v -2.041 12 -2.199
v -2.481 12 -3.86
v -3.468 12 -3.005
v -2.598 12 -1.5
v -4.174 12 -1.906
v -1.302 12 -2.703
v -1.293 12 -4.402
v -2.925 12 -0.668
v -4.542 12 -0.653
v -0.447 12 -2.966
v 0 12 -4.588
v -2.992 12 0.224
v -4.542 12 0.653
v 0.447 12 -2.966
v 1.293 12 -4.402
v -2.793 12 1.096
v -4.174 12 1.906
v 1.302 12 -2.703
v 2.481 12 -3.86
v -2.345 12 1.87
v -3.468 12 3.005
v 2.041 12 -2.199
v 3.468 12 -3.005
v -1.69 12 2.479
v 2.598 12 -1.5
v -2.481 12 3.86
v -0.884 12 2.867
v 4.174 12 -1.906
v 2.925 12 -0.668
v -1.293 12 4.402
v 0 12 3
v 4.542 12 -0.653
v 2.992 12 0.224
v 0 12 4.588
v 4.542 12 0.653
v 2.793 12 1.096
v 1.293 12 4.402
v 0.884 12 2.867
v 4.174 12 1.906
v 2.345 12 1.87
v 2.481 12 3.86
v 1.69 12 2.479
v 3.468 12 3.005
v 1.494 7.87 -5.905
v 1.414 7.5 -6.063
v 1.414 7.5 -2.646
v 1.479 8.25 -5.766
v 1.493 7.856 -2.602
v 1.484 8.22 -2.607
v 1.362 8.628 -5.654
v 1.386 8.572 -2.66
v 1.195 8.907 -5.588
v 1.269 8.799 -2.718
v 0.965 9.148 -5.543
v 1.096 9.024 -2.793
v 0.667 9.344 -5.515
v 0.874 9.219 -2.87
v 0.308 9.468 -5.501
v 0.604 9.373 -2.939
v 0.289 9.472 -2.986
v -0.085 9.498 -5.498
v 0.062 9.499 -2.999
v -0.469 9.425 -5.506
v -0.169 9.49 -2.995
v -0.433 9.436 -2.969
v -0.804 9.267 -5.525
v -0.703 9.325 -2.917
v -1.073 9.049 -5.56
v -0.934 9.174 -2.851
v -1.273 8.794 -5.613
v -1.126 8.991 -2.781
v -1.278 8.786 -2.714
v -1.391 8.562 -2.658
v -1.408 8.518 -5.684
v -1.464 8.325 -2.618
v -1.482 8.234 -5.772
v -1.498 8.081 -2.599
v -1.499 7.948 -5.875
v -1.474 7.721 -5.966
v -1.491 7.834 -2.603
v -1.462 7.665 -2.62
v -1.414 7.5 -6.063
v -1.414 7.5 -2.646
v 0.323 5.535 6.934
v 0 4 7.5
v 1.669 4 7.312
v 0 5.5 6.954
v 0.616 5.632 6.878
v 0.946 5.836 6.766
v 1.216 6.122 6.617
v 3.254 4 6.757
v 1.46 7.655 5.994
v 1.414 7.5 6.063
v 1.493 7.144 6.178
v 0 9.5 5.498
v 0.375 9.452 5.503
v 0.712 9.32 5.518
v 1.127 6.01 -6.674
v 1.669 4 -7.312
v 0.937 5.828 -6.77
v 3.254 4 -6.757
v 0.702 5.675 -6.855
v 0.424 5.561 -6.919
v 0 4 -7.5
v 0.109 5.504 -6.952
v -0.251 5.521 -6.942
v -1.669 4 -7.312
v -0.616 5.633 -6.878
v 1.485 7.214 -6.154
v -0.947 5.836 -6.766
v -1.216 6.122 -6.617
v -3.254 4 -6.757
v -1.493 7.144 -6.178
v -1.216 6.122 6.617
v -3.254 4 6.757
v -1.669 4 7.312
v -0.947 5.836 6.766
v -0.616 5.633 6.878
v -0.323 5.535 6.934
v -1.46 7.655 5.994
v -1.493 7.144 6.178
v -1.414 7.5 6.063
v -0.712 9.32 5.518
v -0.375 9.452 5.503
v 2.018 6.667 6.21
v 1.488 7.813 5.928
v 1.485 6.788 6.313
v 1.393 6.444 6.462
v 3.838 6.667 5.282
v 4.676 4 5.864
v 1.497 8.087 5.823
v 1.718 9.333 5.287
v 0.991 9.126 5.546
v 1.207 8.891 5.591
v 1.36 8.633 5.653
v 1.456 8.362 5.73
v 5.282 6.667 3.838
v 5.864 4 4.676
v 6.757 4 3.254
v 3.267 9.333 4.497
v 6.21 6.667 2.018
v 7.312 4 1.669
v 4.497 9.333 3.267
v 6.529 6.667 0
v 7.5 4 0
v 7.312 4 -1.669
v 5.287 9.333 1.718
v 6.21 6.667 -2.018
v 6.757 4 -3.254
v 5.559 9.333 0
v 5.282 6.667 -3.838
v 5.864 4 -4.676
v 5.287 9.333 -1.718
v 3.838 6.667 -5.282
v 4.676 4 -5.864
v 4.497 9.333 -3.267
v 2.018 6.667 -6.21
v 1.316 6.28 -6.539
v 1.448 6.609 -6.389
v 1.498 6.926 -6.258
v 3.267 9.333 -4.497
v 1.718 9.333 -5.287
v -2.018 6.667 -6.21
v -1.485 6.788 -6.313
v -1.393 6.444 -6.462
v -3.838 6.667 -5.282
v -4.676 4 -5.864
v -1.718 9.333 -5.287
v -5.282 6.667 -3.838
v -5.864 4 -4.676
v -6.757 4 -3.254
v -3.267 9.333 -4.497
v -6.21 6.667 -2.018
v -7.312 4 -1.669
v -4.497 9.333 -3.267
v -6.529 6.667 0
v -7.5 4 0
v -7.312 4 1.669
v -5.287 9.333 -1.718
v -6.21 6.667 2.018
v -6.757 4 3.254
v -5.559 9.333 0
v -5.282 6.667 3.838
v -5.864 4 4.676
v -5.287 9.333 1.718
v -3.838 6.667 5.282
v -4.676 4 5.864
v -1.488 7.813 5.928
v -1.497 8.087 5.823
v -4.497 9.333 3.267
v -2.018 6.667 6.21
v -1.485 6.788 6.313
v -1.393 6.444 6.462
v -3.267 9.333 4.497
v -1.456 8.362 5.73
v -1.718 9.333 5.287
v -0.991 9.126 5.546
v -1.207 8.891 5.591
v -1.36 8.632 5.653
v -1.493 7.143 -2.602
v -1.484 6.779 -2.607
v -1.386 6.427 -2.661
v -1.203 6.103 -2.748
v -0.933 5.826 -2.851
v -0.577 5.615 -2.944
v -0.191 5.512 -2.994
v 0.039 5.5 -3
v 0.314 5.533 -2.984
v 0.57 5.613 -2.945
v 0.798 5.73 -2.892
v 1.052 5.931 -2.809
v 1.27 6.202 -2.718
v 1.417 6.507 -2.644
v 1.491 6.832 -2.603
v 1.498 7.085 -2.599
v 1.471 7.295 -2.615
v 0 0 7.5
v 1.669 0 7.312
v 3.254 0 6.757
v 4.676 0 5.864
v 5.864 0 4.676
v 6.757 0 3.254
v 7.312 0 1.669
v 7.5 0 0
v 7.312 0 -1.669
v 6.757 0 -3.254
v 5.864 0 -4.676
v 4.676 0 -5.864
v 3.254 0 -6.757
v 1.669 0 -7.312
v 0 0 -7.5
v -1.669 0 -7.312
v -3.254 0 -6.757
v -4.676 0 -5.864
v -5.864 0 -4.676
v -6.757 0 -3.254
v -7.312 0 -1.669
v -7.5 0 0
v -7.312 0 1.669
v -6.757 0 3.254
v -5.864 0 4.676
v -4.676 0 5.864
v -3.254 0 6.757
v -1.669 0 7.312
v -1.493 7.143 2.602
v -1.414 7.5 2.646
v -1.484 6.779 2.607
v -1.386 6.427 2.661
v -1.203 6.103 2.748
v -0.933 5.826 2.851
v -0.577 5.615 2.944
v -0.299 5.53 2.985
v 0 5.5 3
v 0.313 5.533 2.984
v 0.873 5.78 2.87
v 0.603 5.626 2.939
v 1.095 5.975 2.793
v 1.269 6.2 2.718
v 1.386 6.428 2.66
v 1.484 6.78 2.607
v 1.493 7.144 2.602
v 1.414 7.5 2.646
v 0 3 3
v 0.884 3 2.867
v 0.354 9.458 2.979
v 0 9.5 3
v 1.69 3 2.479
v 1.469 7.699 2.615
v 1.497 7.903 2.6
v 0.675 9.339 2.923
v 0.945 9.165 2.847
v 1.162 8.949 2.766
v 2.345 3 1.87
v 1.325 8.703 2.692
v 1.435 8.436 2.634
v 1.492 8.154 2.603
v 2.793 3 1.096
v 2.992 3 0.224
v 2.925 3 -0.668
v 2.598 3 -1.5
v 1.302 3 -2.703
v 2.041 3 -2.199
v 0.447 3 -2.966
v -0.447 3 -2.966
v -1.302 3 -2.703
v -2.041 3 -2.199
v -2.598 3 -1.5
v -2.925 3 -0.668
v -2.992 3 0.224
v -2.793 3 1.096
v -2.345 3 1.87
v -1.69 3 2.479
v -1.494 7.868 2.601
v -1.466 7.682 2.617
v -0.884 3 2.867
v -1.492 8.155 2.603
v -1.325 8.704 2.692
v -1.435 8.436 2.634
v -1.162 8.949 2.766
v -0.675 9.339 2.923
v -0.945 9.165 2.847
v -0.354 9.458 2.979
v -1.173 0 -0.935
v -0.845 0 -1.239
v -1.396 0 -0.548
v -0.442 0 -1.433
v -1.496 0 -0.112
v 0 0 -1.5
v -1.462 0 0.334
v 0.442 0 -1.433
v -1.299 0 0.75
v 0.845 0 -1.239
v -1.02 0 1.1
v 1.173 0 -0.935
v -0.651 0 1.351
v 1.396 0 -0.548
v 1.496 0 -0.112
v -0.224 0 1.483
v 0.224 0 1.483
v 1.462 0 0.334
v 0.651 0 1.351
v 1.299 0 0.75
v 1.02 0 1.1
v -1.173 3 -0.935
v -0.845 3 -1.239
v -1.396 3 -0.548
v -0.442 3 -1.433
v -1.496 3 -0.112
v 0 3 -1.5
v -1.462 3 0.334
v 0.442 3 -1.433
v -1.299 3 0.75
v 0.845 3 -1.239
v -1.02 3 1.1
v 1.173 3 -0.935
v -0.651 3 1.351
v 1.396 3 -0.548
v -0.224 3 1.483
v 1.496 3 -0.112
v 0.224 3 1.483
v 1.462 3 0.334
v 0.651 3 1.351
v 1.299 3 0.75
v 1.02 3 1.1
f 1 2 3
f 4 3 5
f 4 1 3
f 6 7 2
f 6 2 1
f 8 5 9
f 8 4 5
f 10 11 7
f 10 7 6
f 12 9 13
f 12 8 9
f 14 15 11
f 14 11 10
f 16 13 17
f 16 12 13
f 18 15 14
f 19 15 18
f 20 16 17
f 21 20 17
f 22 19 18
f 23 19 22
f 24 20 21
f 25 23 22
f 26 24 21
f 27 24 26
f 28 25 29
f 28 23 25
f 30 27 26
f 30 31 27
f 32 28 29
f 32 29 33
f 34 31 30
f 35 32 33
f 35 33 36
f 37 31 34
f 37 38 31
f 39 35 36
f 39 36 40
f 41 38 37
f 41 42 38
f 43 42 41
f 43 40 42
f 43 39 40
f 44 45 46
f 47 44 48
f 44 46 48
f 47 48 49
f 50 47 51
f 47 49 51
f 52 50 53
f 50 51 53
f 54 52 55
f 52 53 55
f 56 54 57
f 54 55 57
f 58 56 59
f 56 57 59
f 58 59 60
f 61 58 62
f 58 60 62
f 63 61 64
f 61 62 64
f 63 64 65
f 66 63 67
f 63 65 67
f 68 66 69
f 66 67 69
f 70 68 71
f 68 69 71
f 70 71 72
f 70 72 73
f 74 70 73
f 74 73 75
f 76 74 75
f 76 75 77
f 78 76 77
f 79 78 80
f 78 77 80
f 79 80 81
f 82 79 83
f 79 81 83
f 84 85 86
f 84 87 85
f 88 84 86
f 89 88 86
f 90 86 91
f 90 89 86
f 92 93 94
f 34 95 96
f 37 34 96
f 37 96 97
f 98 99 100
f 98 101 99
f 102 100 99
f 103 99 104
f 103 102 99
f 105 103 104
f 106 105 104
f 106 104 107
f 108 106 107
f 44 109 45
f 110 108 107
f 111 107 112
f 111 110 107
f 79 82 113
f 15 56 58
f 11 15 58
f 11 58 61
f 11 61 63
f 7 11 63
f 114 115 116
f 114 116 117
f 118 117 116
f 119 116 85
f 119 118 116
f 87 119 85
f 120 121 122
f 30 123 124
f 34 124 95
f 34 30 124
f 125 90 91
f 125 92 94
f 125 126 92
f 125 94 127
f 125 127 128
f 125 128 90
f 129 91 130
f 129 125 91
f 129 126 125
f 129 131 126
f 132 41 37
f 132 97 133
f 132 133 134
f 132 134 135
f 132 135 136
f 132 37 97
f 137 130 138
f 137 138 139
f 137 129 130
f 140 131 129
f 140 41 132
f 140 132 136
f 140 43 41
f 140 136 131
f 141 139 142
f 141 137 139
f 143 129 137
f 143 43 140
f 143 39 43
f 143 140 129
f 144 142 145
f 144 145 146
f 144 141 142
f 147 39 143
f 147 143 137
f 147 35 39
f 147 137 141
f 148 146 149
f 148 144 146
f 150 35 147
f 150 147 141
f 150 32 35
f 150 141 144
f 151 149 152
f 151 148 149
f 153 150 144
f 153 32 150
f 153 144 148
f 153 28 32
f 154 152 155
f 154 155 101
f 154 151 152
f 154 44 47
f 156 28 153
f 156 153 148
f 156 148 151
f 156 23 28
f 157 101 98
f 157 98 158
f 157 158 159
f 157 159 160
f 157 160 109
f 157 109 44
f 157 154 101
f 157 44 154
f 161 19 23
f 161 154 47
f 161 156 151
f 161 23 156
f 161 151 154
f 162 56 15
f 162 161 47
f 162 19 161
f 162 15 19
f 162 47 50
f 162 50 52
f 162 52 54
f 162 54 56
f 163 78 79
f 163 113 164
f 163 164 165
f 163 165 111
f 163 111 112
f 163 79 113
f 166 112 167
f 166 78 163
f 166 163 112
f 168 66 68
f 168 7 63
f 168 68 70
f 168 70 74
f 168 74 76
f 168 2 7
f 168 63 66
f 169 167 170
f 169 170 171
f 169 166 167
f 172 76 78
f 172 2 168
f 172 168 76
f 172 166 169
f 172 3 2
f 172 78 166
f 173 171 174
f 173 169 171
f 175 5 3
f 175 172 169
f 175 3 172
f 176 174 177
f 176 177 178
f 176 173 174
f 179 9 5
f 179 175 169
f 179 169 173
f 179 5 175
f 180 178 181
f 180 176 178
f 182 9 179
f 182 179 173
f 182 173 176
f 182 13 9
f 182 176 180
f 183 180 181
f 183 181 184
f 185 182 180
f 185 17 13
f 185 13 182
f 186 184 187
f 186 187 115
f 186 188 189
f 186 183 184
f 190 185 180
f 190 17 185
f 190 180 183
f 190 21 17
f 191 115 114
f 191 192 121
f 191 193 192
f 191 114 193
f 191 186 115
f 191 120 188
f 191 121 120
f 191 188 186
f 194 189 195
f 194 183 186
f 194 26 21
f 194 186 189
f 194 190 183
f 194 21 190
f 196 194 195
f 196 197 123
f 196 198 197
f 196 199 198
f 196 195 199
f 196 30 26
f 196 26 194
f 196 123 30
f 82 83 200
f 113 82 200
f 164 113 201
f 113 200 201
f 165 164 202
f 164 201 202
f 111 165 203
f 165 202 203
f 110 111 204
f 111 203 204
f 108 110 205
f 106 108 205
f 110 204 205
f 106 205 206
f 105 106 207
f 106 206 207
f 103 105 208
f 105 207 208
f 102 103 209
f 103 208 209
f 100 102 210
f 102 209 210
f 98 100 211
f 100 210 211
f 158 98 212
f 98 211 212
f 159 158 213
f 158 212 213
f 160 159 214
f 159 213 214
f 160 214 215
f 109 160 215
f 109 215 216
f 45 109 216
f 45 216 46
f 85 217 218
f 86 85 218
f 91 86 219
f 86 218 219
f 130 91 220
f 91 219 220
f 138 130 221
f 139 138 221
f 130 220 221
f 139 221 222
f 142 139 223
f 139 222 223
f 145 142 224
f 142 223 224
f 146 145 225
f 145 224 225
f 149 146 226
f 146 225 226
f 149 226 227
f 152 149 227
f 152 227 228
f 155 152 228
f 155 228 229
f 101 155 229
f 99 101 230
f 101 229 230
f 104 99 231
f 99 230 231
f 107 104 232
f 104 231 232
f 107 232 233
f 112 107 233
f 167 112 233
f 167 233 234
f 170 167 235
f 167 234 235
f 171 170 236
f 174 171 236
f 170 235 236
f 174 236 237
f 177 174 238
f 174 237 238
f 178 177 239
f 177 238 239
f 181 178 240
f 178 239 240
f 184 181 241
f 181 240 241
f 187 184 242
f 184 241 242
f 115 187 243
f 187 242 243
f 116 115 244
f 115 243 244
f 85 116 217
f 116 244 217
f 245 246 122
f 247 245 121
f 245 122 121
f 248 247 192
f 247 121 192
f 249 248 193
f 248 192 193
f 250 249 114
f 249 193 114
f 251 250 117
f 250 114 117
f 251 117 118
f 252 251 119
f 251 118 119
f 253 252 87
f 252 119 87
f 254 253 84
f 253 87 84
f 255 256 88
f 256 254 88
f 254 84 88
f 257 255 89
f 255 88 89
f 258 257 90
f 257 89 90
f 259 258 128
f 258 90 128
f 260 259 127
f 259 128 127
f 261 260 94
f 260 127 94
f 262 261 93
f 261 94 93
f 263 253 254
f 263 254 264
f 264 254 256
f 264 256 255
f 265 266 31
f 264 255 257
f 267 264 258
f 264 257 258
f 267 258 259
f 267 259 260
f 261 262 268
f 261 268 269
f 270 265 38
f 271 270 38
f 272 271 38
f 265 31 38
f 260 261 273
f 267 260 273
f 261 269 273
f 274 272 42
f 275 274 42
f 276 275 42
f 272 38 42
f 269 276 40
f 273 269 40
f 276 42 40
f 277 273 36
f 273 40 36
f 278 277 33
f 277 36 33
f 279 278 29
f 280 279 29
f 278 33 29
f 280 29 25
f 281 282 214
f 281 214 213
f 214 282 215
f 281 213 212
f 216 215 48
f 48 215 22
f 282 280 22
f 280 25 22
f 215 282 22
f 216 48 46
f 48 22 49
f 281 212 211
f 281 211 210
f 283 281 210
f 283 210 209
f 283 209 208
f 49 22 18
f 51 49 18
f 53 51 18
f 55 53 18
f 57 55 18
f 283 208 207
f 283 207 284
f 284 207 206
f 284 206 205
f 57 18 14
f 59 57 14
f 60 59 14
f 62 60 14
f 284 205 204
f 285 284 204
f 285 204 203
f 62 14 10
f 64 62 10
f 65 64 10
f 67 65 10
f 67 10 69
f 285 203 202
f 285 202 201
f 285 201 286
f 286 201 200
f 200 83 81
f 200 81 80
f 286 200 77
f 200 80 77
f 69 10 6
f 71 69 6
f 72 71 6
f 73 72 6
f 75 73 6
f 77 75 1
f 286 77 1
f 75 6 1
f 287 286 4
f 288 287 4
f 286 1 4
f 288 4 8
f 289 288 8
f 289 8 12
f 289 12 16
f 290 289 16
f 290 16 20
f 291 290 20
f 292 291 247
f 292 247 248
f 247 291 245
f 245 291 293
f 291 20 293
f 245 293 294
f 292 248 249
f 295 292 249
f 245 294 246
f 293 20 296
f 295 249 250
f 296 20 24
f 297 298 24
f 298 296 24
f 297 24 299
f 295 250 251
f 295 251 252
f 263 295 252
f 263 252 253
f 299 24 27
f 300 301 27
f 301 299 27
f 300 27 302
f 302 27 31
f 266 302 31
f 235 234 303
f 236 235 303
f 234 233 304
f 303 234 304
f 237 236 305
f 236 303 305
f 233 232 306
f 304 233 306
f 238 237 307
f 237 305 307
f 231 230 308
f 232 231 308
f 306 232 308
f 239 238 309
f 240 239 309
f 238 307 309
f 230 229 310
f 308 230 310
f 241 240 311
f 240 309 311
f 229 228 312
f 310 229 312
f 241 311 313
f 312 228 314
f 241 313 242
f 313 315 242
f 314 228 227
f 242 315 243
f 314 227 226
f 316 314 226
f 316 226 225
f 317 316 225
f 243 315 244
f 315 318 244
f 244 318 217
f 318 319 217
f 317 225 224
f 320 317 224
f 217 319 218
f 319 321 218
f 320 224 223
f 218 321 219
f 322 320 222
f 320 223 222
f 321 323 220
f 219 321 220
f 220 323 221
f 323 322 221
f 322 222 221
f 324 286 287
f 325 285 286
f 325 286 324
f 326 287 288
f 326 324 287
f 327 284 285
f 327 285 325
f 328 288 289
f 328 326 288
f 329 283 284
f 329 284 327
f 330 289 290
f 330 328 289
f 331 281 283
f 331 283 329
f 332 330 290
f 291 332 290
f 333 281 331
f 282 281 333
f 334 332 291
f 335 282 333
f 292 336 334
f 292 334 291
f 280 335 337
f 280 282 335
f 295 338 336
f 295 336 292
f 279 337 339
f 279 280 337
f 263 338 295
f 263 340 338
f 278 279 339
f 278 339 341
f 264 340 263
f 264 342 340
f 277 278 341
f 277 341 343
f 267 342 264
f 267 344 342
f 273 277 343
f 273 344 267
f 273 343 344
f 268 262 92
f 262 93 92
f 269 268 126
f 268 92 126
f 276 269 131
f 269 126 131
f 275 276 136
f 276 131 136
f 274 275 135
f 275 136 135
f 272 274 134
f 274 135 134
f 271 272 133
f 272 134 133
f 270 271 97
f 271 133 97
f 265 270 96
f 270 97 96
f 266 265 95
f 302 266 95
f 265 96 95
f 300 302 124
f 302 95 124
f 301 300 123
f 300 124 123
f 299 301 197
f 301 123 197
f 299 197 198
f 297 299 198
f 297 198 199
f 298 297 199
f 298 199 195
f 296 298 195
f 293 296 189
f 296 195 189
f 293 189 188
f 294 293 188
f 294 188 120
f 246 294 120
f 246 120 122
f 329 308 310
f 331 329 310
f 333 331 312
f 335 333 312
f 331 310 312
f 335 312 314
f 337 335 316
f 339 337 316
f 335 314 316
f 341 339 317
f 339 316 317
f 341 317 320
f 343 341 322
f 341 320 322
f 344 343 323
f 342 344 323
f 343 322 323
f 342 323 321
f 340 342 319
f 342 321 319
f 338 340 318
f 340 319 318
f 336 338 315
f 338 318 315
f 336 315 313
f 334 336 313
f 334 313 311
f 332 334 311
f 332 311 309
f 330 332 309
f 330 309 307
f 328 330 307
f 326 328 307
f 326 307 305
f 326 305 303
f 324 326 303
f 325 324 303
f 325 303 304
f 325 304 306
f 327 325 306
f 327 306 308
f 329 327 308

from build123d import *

# Parameters (mm, degrees)
SKETCH1_R           = 7.5
BOSS_EXTRUDE1_DEPTH = 4
SKETCH4_R           = 7.5
BOSS_EXTRUDE4_DEPTH = 8
BOSS_EXTRUDE4_TAPER = 20
SKETCH5_R           = 1.5
CUT_EXTRUDE2_DEPTH  = 17.015617547
SKETCH6_R           = 3
CUT_EXTRUDE3_DEPTH  = 9
SKETCH7_R           = 1.5
CUT_EXTRUDE4_DEPTH  = 23.505555034
SKETCH8_R           = 1.5
CUT_EXTRUDE5_DEPTH  = 23.505555034


with BuildPart() as part:
    # Sketch1 → Boss-Extrude1 (new body)
    with BuildSketch(Plane(origin=(0, 0, 0), x_dir=(1, 0, 0), z_dir=(0, 1, 0))):
        with Locations(Location((0, 0, 0), (0, 0, 270))):
            Circle(SKETCH1_R)
    extrude(amount=BOSS_EXTRUDE1_DEPTH)

    # Sketch4 → Boss-Extrude4 (add)
    with BuildSketch(Plane(origin=(0, 4, 0), x_dir=(1, 0, 0), z_dir=(0, 1, 0))):
        with Locations(Location((0, 0, 0), (0, 0, 270))):
            Circle(SKETCH4_R)
    extrude(amount=BOSS_EXTRUDE4_DEPTH, taper=BOSS_EXTRUDE4_TAPER)

    # Sketch5 → Cut-Extrude2 (cut, through all)
    with BuildSketch(Plane(origin=(0, 0, 0), x_dir=(-1, 0, 0), z_dir=(0, -1, 0))):
        with Locations(Location((0, 0, 0), (0, 0, 90))):
            Circle(SKETCH5_R)
    extrude(amount=-CUT_EXTRUDE2_DEPTH, mode=Mode.SUBTRACT)

    # Sketch6 → Cut-Extrude3 (cut)
    with BuildSketch(Plane(origin=(0, 12, 0), x_dir=(1, 0, 0), z_dir=(0, 1, 0))):
        with Locations(Location((0, 0, 0), (0, 0, 270))):
            Circle(SKETCH6_R)
    extrude(amount=-CUT_EXTRUDE3_DEPTH, mode=Mode.SUBTRACT)

    # Sketch7 → Cut-Extrude4 (cut, through all)
    with BuildSketch(Plane.XY.offset(10)):
        with Locations((0, 8)):
            Circle(SKETCH7_R)
    extrude(amount=-CUT_EXTRUDE4_DEPTH, mode=Mode.SUBTRACT)

    # Sketch8 → Cut-Extrude5 (cut, through all)
    with BuildSketch(Plane.XY.offset(10)):
        with Locations((0, 7)):
            Circle(SKETCH8_R)
    extrude(amount=-CUT_EXTRUDE5_DEPTH, mode=Mode.SUBTRACT)


solid = part.part
